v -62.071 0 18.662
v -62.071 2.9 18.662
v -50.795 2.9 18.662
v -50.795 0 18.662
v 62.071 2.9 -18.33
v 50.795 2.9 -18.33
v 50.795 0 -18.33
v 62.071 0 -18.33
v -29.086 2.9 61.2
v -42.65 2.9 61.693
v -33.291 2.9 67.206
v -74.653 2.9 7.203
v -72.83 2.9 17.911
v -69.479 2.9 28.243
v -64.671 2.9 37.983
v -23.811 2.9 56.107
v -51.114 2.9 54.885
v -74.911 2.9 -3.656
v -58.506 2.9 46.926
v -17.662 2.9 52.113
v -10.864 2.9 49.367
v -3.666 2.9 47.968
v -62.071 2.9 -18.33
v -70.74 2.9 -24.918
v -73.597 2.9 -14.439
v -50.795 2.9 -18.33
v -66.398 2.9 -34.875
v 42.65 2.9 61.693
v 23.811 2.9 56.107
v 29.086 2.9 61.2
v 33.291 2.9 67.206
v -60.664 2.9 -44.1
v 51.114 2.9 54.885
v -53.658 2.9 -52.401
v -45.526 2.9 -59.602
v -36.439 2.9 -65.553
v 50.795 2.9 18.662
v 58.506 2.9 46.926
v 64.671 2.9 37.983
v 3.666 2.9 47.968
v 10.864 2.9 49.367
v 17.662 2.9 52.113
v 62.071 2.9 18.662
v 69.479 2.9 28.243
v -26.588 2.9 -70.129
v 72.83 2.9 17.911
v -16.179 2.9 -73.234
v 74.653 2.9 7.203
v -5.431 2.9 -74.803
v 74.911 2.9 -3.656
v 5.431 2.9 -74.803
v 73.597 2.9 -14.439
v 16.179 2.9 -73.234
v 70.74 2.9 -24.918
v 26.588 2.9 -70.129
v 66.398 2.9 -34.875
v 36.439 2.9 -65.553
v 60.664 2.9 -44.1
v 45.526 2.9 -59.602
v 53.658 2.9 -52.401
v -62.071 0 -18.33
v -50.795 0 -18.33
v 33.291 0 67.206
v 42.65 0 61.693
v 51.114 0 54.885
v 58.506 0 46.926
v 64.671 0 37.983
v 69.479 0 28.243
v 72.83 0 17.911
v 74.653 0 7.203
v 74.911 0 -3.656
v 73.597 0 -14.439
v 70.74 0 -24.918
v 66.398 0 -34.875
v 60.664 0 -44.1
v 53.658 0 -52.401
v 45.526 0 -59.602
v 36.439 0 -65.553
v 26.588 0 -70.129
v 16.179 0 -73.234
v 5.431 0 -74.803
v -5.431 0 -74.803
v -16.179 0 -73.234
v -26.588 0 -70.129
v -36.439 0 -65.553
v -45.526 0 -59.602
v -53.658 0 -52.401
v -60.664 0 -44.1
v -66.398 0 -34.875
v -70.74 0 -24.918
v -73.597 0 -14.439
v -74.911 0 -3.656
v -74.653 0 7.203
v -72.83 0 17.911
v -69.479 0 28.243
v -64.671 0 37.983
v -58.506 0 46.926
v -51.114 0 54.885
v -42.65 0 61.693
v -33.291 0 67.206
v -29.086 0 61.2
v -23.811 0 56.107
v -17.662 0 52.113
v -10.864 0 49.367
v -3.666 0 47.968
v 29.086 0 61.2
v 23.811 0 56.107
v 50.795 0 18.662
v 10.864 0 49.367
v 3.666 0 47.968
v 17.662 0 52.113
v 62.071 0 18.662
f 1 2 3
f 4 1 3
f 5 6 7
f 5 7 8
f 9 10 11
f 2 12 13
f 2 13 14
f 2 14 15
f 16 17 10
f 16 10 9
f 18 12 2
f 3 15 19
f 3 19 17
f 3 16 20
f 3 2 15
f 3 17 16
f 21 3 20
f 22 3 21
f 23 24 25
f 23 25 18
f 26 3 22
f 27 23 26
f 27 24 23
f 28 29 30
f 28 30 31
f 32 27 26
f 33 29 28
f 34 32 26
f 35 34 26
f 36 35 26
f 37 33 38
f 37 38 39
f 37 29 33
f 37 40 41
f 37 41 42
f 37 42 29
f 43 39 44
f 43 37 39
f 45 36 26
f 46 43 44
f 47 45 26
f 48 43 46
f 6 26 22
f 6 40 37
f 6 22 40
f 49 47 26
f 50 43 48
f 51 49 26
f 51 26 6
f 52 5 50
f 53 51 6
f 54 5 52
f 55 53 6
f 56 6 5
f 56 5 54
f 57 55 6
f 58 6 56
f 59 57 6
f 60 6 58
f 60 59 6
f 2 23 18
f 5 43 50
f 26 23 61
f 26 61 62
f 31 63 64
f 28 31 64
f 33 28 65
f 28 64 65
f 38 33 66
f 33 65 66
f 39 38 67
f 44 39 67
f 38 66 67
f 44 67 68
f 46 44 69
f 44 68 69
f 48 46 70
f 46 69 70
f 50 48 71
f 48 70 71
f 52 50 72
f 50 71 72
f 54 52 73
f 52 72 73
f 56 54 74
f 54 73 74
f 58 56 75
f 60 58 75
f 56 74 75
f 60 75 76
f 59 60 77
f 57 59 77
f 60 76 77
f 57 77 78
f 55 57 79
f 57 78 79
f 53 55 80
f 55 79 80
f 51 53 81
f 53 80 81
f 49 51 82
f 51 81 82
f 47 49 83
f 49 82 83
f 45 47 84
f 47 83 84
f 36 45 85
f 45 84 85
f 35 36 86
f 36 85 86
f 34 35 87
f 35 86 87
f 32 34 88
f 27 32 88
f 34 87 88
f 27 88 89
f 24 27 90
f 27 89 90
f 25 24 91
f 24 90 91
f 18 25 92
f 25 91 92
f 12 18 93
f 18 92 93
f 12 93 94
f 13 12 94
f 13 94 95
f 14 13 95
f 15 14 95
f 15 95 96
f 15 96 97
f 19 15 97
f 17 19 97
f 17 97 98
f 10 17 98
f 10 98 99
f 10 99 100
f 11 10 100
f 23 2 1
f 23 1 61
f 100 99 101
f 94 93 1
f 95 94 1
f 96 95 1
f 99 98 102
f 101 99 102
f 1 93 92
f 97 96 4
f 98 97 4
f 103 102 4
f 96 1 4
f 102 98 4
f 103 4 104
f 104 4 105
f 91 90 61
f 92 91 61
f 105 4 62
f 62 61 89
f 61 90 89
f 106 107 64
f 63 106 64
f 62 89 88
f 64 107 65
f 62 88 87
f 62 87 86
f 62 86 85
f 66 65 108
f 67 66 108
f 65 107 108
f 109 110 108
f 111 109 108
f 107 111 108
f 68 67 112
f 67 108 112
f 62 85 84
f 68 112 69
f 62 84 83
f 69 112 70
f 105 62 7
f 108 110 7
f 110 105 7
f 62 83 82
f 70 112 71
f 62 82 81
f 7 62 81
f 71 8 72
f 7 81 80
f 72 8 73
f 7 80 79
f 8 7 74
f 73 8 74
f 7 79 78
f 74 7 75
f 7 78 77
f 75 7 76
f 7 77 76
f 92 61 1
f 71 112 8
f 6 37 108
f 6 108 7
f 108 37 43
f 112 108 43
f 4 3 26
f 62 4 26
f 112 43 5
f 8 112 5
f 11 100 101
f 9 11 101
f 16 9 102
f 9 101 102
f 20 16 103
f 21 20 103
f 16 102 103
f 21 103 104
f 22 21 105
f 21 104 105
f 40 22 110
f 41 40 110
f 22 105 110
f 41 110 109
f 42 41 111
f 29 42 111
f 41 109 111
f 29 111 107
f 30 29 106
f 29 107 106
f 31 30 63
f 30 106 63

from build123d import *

# Parameters (mm, degrees)
BOSS_EXTRUDE1_DEPTH = 2.9
SKETCH2_W           = 11.27569817
SKETCH2_H           = 36.991766838
CUT_EXTRUDE1_DEPTH  = 107.105654892


with BuildPart() as part:
    # Sketch1 → Boss-Extrude1 (new body)
    with BuildSketch(Plane(origin=(0, 0, 0), x_dir=(1, 0, 0), z_dir=(0, 1, 0))):
        with BuildLine():
            ThreePointArc((33.29110537, -67.206415641), (0, 75), (-33.29110537, -67.206415641))
            ThreePointArc((-33.29110537, -67.206415641), (0, -47.791616815), (33.29110537, -67.206415641))
        make_face()
    extrude(amount=BOSS_EXTRUDE1_DEPTH)

    # Sketch2 → Cut-Extrude1 (cut, through all)
    with BuildSketch(Plane(origin=(0, 2.9, 0), x_dir=(1, 0, 0), z_dir=(0, 1, 0))):
        with Locations((-56.433097695, -0.165843751)):
            Rectangle(SKETCH2_W, SKETCH2_H)
        with Locations((56.433097695, -0.165843751)):
            Rectangle(SKETCH2_W, SKETCH2_H)
    extrude(amount=-CUT_EXTRUDE1_DEPTH, mode=Mode.SUBTRACT)


solid = part.part
